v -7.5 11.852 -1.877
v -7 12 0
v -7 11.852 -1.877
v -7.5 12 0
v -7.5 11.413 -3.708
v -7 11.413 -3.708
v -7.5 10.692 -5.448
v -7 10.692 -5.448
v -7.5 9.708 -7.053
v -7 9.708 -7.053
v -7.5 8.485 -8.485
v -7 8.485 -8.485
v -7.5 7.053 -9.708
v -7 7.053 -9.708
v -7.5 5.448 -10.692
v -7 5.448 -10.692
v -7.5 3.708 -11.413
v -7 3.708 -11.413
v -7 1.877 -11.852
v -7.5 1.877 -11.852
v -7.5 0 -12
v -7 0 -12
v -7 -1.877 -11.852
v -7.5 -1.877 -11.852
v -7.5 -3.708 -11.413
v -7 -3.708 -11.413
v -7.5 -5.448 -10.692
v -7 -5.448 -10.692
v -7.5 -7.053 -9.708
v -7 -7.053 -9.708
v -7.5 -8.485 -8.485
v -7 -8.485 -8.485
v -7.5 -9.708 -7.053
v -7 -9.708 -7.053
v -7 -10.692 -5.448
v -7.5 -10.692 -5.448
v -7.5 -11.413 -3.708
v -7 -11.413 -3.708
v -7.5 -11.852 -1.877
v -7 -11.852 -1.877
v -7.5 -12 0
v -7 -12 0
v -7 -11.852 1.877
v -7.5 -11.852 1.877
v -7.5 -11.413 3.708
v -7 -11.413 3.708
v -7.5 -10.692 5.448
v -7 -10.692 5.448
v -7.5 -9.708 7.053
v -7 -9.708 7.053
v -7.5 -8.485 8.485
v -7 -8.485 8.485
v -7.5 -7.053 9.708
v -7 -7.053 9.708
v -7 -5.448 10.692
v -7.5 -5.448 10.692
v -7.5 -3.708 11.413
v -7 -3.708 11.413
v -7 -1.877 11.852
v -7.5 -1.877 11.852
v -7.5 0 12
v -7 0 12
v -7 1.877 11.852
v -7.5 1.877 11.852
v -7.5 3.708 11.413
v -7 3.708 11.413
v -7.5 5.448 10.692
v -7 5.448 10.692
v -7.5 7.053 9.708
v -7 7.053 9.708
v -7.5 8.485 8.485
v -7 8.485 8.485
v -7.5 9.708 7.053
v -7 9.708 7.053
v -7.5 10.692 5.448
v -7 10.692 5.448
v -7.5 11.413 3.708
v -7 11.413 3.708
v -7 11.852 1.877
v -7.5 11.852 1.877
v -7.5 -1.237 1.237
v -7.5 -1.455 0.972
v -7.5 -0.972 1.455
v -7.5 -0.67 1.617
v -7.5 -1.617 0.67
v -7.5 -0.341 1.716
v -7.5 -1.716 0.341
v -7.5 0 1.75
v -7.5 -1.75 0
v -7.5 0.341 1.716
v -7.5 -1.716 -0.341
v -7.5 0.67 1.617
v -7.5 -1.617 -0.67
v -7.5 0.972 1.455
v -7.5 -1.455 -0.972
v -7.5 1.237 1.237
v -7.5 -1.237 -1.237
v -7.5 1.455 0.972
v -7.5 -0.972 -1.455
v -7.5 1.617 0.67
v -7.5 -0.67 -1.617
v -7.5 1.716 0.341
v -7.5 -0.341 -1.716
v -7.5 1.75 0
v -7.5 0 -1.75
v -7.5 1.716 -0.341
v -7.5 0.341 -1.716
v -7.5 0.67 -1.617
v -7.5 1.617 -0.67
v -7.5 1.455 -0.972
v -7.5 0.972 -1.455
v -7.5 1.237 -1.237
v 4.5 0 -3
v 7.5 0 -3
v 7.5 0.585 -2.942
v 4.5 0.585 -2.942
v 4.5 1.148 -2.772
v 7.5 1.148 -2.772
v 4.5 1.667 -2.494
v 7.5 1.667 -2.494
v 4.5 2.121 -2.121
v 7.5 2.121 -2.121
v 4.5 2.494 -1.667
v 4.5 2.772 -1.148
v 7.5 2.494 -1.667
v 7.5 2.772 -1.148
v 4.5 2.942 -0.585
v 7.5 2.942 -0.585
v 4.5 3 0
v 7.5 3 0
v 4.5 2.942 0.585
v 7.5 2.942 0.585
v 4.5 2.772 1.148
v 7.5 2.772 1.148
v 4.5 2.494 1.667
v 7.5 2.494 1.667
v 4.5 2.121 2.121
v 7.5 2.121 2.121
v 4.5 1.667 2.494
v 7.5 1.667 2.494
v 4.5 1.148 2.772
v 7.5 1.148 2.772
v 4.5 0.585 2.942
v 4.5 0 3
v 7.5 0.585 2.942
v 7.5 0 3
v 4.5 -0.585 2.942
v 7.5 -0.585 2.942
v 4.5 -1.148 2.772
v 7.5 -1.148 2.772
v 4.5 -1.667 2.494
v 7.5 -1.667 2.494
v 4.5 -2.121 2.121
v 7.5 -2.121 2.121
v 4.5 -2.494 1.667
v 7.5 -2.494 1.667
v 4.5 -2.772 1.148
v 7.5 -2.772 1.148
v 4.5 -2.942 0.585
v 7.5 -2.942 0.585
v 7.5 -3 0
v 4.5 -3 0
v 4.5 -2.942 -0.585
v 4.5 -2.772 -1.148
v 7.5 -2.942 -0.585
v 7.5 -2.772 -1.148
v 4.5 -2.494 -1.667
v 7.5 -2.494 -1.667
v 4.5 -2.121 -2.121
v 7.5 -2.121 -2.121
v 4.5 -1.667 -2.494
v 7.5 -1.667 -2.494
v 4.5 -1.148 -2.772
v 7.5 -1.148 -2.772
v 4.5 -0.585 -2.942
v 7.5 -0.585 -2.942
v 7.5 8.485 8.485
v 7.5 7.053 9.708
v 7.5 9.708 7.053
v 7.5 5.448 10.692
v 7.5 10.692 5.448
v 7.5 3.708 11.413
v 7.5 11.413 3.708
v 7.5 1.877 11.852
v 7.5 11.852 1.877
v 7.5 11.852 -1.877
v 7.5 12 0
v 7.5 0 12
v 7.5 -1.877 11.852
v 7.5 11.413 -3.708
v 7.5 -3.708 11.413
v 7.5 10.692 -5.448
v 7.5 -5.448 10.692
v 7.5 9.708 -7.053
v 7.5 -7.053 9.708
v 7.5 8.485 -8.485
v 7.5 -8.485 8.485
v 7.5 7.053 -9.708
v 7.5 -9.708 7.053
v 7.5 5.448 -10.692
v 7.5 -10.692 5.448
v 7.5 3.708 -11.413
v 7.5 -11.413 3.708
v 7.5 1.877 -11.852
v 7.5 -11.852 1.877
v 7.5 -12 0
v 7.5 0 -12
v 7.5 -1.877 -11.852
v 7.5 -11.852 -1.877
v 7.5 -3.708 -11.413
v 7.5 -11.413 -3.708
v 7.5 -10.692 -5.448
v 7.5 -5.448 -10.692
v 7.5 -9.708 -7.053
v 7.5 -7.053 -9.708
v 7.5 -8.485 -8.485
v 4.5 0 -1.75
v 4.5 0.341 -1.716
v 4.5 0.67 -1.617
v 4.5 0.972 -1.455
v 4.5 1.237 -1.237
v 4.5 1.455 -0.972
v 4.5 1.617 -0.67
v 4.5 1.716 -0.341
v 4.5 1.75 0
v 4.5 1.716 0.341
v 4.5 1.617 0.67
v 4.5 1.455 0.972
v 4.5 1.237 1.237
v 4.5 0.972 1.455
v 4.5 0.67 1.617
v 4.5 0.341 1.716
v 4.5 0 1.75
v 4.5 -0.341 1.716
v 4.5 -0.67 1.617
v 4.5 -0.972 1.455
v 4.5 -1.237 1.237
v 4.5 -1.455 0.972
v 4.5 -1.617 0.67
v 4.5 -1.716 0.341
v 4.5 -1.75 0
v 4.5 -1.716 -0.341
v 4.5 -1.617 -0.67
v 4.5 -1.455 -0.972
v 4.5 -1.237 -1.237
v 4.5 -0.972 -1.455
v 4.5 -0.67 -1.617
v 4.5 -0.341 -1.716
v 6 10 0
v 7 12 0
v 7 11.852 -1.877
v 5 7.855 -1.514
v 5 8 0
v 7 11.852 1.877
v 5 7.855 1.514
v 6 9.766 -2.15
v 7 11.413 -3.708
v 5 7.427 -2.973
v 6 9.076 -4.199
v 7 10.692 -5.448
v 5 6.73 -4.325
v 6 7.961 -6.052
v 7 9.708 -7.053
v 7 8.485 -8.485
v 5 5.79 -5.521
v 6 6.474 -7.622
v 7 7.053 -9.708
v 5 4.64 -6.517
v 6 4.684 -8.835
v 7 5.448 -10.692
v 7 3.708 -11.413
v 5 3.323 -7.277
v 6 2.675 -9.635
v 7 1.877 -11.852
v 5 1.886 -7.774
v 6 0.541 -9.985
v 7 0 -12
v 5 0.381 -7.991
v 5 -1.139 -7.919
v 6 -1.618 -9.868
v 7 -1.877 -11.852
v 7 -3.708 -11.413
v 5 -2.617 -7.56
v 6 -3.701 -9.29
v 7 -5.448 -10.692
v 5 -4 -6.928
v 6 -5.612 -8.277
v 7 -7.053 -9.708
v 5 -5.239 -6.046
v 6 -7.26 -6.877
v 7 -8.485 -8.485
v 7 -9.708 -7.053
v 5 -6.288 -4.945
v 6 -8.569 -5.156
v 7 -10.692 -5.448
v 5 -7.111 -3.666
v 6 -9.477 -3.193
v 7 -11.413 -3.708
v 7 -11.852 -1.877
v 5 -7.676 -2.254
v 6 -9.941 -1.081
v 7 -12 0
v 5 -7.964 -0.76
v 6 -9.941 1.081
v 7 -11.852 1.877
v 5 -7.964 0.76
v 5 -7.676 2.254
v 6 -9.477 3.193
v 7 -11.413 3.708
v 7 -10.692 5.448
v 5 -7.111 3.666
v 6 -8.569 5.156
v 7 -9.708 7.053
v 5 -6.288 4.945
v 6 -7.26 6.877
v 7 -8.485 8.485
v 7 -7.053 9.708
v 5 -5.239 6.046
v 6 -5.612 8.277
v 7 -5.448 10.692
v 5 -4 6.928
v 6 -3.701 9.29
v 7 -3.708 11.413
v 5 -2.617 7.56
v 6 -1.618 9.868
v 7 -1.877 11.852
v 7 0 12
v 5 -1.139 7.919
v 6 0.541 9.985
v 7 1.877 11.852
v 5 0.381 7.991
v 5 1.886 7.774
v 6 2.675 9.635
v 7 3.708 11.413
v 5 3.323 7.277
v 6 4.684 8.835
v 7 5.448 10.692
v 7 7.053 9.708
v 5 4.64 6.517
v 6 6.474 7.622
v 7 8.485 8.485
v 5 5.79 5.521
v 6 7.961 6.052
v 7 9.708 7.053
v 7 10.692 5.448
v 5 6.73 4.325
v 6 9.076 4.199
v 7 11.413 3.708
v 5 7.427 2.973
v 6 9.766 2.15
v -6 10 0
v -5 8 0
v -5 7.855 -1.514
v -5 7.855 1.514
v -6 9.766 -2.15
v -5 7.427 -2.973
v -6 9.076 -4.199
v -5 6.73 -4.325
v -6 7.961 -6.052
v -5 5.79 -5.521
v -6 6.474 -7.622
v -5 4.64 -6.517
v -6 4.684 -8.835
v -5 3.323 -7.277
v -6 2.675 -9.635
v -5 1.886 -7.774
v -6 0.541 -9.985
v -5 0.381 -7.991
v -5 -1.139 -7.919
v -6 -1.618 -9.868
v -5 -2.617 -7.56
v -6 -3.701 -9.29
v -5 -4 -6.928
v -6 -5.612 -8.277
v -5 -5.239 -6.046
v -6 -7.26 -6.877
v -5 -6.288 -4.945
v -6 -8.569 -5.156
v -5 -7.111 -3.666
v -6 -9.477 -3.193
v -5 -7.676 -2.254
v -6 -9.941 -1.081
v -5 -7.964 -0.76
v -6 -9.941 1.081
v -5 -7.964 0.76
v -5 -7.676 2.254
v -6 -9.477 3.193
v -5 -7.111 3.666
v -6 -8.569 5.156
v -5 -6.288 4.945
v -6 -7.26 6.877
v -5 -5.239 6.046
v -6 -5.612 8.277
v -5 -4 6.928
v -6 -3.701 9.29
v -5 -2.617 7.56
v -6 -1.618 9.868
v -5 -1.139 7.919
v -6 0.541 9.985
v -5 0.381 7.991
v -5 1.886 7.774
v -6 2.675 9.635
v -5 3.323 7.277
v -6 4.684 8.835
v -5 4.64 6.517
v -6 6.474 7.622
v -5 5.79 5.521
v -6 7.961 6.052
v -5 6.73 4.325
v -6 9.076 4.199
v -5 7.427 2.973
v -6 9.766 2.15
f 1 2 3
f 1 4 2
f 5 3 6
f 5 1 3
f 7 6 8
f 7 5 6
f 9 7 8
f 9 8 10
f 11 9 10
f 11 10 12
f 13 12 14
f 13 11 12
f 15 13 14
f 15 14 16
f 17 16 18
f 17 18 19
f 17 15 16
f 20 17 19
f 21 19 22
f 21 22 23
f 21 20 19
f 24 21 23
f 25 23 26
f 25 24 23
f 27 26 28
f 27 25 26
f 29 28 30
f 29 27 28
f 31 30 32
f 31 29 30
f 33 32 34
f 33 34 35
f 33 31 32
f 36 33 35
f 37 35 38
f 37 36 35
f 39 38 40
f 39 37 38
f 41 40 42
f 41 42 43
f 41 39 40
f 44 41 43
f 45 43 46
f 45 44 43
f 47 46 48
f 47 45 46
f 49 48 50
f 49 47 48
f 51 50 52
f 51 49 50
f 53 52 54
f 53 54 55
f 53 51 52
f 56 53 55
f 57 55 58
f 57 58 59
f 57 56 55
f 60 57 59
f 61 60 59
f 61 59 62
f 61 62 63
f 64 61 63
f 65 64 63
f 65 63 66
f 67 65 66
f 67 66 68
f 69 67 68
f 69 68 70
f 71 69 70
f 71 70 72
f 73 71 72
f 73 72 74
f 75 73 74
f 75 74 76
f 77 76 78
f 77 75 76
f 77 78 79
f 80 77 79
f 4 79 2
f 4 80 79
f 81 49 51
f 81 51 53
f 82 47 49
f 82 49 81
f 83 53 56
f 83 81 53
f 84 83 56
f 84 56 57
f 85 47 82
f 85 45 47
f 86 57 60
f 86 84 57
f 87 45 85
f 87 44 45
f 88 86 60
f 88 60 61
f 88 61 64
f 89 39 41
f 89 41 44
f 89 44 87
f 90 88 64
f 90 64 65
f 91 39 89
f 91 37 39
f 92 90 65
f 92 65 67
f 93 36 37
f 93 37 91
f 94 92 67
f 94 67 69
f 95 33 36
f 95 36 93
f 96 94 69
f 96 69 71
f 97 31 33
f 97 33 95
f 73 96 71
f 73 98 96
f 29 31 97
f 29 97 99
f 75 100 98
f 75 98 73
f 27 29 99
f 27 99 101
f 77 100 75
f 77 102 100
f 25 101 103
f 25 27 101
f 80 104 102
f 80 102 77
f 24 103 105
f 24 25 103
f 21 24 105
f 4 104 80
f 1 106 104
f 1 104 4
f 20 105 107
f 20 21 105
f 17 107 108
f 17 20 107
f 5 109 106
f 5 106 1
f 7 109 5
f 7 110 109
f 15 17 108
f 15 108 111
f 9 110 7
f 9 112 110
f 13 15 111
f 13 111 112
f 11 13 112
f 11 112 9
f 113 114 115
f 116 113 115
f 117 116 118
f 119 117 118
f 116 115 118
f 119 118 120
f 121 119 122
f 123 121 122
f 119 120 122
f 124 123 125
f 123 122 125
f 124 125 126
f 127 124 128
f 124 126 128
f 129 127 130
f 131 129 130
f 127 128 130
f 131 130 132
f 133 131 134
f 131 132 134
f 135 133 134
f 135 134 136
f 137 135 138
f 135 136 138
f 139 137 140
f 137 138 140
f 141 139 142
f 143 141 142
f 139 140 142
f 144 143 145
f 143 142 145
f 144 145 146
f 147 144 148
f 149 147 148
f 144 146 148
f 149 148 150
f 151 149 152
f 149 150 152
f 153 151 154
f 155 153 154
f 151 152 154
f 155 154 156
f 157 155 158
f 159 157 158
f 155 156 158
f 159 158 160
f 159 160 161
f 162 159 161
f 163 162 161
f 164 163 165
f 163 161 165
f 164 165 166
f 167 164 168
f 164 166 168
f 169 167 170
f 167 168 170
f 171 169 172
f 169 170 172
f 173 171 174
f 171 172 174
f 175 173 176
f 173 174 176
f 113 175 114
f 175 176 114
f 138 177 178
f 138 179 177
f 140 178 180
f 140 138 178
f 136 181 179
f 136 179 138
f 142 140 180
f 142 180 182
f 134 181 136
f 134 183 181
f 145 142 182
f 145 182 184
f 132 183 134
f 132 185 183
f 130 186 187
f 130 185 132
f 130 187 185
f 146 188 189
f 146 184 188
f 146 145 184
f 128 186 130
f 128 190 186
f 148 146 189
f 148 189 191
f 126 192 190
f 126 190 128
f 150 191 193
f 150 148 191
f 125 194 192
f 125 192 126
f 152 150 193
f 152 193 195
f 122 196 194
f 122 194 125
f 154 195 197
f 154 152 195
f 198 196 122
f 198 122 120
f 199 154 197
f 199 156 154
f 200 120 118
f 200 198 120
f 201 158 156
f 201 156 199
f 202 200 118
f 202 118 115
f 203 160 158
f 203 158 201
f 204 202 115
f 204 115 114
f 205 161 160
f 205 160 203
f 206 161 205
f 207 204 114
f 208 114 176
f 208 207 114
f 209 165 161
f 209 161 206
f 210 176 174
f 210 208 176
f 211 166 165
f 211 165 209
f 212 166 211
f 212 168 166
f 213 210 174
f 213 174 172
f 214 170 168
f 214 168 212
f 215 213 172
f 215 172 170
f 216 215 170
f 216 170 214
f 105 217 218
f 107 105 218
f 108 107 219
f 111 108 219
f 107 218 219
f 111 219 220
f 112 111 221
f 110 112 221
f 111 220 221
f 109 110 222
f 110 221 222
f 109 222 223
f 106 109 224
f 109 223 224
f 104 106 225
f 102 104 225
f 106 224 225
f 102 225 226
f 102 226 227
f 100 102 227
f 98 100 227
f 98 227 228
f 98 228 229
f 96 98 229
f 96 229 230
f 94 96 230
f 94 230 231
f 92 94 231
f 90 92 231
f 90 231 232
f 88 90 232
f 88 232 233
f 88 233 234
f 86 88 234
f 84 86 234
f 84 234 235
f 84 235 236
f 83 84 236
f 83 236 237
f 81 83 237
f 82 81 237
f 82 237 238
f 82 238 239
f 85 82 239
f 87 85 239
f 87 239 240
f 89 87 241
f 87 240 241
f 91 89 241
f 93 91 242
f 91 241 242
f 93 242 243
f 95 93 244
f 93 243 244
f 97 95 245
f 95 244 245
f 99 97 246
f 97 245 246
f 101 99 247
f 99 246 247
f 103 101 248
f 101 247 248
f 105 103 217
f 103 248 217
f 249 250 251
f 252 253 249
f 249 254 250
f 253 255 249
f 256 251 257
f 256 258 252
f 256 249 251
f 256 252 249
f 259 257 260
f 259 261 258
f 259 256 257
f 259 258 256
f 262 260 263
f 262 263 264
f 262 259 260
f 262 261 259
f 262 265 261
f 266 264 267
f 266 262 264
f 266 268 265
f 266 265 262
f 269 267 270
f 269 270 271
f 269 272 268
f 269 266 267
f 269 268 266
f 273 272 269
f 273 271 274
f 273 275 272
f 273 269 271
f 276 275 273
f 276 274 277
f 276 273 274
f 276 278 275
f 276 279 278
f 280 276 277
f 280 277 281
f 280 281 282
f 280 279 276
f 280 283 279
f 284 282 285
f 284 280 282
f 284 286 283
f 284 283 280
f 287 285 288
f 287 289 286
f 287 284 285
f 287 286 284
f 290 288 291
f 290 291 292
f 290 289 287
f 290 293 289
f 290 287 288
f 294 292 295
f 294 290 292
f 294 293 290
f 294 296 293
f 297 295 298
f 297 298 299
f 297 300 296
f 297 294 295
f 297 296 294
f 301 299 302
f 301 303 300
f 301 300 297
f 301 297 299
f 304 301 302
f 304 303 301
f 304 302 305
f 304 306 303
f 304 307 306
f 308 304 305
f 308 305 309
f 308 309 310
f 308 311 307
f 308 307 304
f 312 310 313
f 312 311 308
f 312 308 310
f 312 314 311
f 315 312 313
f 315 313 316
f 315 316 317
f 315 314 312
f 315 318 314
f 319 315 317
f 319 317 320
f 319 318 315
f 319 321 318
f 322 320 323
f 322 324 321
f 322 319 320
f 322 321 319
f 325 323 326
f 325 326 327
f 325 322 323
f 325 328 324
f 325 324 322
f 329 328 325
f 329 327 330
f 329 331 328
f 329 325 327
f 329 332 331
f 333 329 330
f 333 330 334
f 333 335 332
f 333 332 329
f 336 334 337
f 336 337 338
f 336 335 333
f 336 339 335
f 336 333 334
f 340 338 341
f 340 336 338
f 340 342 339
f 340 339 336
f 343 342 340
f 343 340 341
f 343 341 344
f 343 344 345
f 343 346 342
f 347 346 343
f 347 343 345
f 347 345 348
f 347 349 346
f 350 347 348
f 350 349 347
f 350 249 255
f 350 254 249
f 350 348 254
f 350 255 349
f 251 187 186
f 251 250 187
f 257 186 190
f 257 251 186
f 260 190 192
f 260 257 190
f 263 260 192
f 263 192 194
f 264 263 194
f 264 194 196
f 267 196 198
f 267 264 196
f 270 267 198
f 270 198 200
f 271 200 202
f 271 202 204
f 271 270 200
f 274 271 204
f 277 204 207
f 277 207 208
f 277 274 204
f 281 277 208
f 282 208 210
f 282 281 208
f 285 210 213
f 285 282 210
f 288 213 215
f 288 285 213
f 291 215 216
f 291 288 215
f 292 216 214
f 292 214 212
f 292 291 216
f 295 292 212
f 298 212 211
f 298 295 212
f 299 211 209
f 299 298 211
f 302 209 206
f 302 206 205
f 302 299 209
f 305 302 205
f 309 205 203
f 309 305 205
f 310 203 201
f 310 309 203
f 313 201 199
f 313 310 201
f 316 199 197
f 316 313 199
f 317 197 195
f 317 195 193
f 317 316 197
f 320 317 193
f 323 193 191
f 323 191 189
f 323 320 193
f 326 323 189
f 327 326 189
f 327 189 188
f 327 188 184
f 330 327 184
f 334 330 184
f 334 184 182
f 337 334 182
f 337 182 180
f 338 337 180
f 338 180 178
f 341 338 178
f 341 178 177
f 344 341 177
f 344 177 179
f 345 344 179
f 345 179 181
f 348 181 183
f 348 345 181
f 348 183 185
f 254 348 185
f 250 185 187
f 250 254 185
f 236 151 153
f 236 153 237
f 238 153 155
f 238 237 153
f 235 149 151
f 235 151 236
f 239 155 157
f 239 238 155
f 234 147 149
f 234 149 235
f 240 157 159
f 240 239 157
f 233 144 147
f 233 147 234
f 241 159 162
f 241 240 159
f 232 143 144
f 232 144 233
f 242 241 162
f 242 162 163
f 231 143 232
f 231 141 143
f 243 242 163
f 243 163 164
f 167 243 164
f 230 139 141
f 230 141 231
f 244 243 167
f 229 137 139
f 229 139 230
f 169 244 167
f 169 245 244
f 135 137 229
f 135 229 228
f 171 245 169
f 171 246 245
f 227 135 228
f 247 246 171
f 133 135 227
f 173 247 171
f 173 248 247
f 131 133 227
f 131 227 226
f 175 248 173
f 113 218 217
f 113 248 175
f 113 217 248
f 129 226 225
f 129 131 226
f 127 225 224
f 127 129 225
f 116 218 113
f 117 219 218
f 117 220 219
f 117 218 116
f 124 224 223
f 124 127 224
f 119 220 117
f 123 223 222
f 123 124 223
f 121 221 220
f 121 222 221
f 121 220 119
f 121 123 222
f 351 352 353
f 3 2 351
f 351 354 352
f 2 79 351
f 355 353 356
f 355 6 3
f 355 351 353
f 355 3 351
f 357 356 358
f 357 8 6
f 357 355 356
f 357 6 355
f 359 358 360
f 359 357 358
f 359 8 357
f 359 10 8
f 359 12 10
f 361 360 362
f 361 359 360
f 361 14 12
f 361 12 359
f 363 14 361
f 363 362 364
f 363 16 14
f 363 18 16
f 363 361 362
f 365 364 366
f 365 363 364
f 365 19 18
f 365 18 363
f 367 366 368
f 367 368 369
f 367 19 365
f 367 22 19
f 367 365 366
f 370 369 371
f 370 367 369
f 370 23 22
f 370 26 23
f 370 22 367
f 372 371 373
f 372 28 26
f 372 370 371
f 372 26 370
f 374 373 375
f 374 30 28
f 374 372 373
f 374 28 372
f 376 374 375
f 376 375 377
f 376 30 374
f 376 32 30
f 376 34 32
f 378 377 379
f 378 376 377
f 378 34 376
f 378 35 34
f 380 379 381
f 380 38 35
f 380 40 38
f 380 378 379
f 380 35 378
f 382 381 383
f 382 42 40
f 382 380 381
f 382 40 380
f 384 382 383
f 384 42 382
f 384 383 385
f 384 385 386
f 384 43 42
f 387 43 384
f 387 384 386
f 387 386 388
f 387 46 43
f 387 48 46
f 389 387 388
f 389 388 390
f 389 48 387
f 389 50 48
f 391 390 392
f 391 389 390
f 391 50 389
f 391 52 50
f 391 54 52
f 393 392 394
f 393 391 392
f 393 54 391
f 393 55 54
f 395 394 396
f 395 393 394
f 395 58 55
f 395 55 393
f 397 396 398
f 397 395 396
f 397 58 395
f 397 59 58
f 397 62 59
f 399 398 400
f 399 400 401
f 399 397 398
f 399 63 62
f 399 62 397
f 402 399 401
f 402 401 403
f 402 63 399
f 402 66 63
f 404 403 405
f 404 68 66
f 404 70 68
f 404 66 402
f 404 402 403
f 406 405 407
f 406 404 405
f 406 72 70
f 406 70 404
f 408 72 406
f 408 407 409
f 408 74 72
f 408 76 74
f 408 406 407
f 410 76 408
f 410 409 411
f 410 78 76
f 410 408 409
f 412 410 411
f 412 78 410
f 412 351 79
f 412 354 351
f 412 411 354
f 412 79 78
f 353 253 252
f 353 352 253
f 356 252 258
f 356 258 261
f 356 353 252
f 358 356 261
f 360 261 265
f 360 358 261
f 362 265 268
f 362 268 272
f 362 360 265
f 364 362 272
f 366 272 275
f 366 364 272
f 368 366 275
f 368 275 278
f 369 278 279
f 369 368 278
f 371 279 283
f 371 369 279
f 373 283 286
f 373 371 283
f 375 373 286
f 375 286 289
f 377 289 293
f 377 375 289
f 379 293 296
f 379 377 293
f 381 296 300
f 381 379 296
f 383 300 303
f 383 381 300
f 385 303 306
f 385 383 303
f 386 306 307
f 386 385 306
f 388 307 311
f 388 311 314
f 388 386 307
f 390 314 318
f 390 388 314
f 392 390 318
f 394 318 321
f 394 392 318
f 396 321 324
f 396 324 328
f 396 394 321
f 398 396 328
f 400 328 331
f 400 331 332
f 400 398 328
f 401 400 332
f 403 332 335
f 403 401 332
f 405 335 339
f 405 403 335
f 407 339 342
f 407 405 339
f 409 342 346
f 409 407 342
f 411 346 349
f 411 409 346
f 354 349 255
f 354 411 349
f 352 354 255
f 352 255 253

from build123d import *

# Parameters (mm, degrees)
ESQUISSE2_R                  = 3
ENL_V_MAT_EXTRU_1_DEPTH      = 3
ESQUISSE3_R                  = 1.75
ENL_V_MAT_EXTRU_2_DEPTH      = 4
ENL_V_MAT_EXTRU_2_DEPTH_BACK = 13


with BuildPart() as part:
    # Esquisse1 → Révolution1 (revolve)
    with BuildSketch(Plane.XY):
        Polygon((-7.5, 0), (7.5, 0), (7.5, 12), (7, 12), (5, 8), (-5, 8), (-7, 12), (-7.5, 12), align=None)
    revolve(axis=Axis((0, 0, 0), (-1, 0, 0)))

    # Esquisse2 → Enlèv. mat.-Extru.1 (cut)
    with BuildSketch(Plane(origin=(7.5, 0, 0), x_dir=(0, 0, -1), z_dir=(1, 0, 0))):
        Circle(ESQUISSE2_R)
    extrude(amount=-ENL_V_MAT_EXTRU_1_DEPTH, mode=Mode.SUBTRACT)

    # Esquisse3 → Enlèv. mat.-Extru.2 (cut, two sides)
    with BuildSketch(Plane(origin=(4.5, 0, 0), x_dir=(0, 0, -1), z_dir=(1, 0, 0))) as enl_v_mat_extru_2_sk:
        Circle(ESQUISSE3_R)
    extrude(amount=ENL_V_MAT_EXTRU_2_DEPTH, mode=Mode.SUBTRACT)
    extrude(enl_v_mat_extru_2_sk.sketch, amount=-ENL_V_MAT_EXTRU_2_DEPTH_BACK, mode=Mode.SUBTRACT)


solid = part.part
